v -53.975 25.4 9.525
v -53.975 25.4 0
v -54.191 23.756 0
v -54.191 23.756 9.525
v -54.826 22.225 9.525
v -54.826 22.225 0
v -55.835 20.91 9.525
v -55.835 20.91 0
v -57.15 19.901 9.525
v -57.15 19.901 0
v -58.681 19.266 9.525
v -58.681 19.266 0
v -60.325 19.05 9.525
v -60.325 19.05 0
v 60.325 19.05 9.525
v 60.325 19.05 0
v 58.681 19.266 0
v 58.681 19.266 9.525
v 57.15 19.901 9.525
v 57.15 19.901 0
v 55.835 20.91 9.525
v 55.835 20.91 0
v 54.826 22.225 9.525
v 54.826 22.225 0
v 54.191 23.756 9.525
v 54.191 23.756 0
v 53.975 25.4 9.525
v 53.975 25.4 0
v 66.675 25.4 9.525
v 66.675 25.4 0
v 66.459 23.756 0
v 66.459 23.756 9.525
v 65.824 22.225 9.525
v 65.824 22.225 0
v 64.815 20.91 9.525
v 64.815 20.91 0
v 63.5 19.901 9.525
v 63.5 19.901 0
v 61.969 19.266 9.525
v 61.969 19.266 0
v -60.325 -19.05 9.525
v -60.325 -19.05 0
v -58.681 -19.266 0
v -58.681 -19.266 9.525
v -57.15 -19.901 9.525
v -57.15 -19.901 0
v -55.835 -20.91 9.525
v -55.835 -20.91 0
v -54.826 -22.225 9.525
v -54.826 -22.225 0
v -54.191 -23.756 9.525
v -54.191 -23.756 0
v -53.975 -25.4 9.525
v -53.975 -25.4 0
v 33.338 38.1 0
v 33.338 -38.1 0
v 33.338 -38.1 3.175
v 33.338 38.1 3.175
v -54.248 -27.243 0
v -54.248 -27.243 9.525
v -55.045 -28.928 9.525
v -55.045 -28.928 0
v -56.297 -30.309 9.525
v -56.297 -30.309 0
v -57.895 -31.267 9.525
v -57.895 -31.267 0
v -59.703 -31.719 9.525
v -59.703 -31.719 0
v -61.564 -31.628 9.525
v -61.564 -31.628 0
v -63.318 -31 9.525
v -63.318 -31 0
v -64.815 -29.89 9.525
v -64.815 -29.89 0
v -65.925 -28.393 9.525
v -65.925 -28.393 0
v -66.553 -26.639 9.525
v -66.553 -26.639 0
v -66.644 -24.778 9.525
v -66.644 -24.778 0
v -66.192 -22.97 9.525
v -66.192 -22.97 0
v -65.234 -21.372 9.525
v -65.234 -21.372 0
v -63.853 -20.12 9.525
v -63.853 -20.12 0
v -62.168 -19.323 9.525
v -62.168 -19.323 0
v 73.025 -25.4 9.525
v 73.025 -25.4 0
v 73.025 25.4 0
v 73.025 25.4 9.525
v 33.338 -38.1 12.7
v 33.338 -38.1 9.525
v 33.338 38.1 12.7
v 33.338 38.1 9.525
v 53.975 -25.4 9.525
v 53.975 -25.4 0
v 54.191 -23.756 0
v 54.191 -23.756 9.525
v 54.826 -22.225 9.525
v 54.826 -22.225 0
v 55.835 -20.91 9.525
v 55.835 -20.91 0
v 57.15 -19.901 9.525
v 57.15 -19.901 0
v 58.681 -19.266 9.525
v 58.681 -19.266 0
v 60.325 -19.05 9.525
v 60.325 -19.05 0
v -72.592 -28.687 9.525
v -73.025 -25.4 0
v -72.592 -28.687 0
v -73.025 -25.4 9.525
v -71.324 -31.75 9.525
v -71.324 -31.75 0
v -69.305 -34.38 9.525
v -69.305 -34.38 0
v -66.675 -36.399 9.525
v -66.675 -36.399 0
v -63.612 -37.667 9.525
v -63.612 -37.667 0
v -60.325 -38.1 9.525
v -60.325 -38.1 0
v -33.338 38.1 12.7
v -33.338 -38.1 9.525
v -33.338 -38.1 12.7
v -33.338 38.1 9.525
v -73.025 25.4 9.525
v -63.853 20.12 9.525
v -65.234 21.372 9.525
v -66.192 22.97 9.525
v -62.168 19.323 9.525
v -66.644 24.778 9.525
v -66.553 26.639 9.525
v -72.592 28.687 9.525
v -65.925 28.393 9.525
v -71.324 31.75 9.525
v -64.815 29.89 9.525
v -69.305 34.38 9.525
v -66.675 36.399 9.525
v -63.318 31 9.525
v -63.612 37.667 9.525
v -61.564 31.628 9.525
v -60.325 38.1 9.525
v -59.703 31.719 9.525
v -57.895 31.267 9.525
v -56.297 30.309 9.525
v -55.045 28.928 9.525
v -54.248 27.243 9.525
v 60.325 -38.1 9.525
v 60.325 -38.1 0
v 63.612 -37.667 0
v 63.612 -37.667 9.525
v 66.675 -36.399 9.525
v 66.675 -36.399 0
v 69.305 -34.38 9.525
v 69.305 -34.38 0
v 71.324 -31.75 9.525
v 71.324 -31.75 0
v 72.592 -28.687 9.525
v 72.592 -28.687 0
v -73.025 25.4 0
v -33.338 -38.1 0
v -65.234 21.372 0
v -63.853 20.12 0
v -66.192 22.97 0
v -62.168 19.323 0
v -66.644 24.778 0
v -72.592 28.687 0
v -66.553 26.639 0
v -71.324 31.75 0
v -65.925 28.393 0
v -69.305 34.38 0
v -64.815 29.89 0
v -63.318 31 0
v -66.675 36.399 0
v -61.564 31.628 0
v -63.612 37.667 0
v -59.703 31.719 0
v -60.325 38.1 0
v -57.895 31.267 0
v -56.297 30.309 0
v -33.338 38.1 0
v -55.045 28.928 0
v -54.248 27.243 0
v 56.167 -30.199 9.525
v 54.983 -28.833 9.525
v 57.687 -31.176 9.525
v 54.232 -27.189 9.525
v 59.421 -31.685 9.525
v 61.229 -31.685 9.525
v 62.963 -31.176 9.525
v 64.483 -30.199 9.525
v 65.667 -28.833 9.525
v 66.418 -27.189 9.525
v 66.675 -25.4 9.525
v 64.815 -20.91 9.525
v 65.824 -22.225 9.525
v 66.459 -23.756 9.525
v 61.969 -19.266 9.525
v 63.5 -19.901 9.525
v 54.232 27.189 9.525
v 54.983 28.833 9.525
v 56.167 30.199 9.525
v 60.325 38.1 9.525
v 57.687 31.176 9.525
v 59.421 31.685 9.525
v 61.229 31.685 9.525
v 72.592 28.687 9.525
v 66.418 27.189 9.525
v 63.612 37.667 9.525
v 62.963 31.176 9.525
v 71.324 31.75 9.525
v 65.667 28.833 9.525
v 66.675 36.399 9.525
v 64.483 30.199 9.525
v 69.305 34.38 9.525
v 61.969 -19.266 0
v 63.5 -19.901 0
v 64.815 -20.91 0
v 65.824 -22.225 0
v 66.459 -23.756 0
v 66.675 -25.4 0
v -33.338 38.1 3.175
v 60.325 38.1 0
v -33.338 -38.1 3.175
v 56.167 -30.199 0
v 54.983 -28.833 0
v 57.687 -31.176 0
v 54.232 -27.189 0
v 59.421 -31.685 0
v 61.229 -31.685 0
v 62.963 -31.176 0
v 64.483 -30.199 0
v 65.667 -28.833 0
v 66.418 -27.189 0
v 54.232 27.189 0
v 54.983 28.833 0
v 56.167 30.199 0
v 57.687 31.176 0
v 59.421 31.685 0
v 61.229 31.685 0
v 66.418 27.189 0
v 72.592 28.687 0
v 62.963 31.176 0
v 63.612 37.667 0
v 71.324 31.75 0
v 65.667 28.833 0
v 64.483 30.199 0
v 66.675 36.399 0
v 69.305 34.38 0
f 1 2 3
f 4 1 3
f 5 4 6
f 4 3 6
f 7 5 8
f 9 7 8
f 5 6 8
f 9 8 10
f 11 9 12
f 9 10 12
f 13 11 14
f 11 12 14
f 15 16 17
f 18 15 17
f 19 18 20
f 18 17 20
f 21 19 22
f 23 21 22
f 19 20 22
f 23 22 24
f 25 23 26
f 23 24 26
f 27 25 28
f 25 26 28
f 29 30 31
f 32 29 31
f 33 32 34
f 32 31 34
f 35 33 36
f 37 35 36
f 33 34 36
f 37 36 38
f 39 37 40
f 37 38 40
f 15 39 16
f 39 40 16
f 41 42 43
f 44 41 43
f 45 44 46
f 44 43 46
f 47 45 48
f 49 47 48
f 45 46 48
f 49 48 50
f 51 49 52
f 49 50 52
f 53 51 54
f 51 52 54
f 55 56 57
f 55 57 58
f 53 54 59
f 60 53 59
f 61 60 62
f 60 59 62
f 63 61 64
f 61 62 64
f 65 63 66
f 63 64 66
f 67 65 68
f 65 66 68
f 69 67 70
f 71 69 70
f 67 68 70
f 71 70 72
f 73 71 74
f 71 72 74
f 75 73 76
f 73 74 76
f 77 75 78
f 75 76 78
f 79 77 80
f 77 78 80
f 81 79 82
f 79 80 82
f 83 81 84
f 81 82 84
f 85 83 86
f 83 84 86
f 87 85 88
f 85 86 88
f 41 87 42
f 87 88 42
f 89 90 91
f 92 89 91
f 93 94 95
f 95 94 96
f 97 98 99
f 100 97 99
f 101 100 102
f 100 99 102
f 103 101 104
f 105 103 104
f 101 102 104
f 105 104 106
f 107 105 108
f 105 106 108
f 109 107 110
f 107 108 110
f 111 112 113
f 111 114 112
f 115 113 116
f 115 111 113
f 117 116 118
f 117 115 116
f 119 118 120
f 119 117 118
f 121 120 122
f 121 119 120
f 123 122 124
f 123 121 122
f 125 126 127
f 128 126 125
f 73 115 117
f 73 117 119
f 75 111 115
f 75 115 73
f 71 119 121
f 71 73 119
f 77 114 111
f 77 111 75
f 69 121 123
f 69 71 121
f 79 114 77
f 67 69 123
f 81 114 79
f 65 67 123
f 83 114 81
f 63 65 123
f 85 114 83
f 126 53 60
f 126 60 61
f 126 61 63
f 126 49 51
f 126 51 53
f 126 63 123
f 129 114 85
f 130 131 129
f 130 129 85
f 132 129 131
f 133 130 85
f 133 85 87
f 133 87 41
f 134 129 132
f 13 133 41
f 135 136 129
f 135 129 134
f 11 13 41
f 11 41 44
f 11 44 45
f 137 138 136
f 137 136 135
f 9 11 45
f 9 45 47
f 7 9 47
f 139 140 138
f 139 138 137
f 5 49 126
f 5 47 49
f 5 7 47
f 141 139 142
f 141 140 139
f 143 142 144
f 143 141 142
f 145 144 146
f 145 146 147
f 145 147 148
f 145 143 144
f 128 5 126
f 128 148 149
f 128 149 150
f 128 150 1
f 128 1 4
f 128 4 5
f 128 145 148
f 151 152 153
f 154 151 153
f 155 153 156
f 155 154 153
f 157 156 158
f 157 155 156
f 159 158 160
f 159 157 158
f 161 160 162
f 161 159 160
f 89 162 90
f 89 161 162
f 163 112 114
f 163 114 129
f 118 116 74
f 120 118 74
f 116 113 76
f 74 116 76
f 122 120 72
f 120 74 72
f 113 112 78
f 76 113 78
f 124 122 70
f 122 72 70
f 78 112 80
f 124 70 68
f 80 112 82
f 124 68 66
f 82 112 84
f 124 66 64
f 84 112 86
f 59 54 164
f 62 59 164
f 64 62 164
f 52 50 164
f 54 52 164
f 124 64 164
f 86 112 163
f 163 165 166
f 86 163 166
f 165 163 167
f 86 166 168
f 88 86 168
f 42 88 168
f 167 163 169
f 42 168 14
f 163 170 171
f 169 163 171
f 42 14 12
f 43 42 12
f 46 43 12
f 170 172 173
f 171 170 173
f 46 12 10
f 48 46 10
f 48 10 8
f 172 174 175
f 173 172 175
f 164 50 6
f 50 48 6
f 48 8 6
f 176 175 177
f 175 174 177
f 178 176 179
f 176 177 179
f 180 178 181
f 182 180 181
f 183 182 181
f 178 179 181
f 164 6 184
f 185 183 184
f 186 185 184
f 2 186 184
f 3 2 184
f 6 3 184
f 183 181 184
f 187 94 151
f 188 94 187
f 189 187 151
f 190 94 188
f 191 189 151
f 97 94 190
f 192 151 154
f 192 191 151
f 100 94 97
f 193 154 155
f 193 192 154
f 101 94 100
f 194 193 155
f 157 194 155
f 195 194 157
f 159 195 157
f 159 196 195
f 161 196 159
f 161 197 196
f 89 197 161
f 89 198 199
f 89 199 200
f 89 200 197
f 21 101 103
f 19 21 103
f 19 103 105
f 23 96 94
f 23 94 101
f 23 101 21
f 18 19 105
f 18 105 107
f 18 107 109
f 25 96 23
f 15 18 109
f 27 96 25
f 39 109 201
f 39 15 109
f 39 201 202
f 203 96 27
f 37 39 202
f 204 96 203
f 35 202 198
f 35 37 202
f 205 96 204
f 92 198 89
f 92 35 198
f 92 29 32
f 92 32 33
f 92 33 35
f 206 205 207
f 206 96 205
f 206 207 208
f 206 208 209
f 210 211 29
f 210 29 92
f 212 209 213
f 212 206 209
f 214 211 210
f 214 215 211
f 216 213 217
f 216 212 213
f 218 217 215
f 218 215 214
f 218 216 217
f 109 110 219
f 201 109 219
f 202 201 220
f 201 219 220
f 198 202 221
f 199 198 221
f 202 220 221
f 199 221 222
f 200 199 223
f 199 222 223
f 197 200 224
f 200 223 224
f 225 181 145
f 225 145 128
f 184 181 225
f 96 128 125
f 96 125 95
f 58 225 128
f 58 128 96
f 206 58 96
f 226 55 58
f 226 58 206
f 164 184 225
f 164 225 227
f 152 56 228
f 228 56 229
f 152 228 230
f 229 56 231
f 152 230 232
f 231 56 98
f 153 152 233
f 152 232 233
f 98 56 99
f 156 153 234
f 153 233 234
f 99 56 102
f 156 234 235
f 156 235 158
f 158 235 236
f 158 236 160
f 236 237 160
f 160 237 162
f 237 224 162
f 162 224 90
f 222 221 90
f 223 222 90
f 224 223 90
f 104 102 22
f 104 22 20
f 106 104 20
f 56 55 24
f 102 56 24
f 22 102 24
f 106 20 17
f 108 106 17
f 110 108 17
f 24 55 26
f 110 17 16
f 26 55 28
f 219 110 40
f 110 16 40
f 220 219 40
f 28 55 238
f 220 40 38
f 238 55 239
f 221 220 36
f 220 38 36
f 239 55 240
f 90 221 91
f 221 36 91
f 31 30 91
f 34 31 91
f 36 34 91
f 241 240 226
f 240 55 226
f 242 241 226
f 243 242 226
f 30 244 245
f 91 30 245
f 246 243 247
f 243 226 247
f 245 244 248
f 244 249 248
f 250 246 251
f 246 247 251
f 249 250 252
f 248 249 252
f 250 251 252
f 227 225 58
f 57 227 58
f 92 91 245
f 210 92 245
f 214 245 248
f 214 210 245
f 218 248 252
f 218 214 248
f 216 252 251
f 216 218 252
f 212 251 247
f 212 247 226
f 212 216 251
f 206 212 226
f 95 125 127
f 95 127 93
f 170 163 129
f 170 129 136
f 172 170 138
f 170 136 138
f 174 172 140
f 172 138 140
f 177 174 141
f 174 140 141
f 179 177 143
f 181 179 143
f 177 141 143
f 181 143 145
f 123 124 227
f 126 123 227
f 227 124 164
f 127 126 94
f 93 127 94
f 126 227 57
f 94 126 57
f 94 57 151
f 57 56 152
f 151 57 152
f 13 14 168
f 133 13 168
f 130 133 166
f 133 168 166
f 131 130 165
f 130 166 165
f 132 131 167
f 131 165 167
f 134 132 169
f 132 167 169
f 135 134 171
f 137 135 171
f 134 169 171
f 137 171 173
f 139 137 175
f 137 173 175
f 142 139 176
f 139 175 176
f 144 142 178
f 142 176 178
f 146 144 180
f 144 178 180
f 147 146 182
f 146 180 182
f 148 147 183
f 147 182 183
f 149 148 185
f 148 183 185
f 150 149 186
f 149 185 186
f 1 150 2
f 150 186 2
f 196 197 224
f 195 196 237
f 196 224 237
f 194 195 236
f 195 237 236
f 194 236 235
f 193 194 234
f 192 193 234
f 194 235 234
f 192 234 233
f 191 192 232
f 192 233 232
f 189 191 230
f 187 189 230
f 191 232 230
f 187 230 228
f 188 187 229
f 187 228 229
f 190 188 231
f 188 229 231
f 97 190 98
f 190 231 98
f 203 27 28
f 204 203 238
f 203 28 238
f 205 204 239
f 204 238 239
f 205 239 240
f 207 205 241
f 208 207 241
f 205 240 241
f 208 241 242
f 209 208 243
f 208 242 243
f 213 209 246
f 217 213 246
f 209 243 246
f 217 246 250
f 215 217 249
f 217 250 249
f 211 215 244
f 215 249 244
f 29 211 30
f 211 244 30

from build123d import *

# Parameters (mm, degrees)
F0_W     = 146.05
F0_H     = 76.2
F1_DEPTH = 9.525
F2_R     = 12.7
F3_W     = 66.675
F3_H     = 76.2
F4_DEPTH = 3.175
F5_W     = 66.675
F5_H     = 12.7
F5_H_2   = 50.8
F6_DEPTH = 3.175


with BuildPart() as f1:
    # F0 (on Top) → F1 (new body)
    with BuildSketch(Plane.XY):
        Rectangle(F0_W, F0_H)
        with BuildLine():
            ThreePointArc((-60.325, 19.05), (-64.8151280605, 29.8901280605), (-53.975, 25.4))
            Line((-53.975, 25.4), (53.975, 25.4))
            ThreePointArc((53.975, 25.4), (60.325, 31.75), (66.675, 25.4))
            ThreePointArc((66.675, 25.4), (64.8151280605, 20.9098719395), (60.325, 19.05))
            Line((60.325, 19.05), (60.325, -19.05))
            ThreePointArc((60.325, -19.05), (64.8151280605, -20.9098719395), (66.675, -25.4))
            ThreePointArc((66.675, -25.4), (60.325, -31.75), (53.975, -25.4))
            Line((53.975, -25.4), (-53.975, -25.4))
            ThreePointArc((-53.975, -25.4), (-64.8151280605, -29.8901280605), (-60.325, -19.05))
            Line((-60.325, -19.05), (-60.325, 19.05))
        make_face(mode=Mode.SUBTRACT)
        with BuildLine():
            Line((53.975, 25.4), (-53.975, 25.4))
            ThreePointArc((-53.975, 25.4), (-55.8348719395, 20.9098719395), (-60.325, 19.05))
            Line((-60.325, 19.05), (-60.325, -19.05))
            ThreePointArc((-60.325, -19.05), (-55.8348719395, -20.9098719395), (-53.975, -25.4))
            Line((-53.975, -25.4), (53.975, -25.4))
            ThreePointArc((53.975, -25.4), (55.8348719395, -20.9098719395), (60.325, -19.05))
            Line((60.325, -19.05), (60.325, 19.05))
            ThreePointArc((60.325, 19.05), (55.8348719395, 20.9098719395), (53.975, 25.4))
        make_face()
    extrude(amount=F1_DEPTH)

    # F2
    f2_edges = [f1.edges().sort_by_distance(p)[0] for p in [
        (-73.025, -38.1, 4.7625),
        (-73.025, 38.1, 4.7625),
        (73.025, 38.1, 4.7625),
        (73.025, -38.1, 4.7625),
    ]]
    fillet(f2_edges, radius=F2_R)

    # F3 (on face) → F4 (join)
    with BuildSketch(Plane.XY.offset(9.525)):
        Rectangle(F3_W, F3_H)
    extrude(amount=F4_DEPTH)

    # F5 (on face) → F6 (cut)
    with BuildSketch(Plane.XY):
        with Locations((0, 31.75)):
            Rectangle(F5_W, F5_H)
        Rectangle(F5_W, F5_H_2)
        with Locations((0, -31.75)):
            Rectangle(F5_W, F5_H)
    extrude(amount=F6_DEPTH, mode=Mode.SUBTRACT)


solid = f1.part
